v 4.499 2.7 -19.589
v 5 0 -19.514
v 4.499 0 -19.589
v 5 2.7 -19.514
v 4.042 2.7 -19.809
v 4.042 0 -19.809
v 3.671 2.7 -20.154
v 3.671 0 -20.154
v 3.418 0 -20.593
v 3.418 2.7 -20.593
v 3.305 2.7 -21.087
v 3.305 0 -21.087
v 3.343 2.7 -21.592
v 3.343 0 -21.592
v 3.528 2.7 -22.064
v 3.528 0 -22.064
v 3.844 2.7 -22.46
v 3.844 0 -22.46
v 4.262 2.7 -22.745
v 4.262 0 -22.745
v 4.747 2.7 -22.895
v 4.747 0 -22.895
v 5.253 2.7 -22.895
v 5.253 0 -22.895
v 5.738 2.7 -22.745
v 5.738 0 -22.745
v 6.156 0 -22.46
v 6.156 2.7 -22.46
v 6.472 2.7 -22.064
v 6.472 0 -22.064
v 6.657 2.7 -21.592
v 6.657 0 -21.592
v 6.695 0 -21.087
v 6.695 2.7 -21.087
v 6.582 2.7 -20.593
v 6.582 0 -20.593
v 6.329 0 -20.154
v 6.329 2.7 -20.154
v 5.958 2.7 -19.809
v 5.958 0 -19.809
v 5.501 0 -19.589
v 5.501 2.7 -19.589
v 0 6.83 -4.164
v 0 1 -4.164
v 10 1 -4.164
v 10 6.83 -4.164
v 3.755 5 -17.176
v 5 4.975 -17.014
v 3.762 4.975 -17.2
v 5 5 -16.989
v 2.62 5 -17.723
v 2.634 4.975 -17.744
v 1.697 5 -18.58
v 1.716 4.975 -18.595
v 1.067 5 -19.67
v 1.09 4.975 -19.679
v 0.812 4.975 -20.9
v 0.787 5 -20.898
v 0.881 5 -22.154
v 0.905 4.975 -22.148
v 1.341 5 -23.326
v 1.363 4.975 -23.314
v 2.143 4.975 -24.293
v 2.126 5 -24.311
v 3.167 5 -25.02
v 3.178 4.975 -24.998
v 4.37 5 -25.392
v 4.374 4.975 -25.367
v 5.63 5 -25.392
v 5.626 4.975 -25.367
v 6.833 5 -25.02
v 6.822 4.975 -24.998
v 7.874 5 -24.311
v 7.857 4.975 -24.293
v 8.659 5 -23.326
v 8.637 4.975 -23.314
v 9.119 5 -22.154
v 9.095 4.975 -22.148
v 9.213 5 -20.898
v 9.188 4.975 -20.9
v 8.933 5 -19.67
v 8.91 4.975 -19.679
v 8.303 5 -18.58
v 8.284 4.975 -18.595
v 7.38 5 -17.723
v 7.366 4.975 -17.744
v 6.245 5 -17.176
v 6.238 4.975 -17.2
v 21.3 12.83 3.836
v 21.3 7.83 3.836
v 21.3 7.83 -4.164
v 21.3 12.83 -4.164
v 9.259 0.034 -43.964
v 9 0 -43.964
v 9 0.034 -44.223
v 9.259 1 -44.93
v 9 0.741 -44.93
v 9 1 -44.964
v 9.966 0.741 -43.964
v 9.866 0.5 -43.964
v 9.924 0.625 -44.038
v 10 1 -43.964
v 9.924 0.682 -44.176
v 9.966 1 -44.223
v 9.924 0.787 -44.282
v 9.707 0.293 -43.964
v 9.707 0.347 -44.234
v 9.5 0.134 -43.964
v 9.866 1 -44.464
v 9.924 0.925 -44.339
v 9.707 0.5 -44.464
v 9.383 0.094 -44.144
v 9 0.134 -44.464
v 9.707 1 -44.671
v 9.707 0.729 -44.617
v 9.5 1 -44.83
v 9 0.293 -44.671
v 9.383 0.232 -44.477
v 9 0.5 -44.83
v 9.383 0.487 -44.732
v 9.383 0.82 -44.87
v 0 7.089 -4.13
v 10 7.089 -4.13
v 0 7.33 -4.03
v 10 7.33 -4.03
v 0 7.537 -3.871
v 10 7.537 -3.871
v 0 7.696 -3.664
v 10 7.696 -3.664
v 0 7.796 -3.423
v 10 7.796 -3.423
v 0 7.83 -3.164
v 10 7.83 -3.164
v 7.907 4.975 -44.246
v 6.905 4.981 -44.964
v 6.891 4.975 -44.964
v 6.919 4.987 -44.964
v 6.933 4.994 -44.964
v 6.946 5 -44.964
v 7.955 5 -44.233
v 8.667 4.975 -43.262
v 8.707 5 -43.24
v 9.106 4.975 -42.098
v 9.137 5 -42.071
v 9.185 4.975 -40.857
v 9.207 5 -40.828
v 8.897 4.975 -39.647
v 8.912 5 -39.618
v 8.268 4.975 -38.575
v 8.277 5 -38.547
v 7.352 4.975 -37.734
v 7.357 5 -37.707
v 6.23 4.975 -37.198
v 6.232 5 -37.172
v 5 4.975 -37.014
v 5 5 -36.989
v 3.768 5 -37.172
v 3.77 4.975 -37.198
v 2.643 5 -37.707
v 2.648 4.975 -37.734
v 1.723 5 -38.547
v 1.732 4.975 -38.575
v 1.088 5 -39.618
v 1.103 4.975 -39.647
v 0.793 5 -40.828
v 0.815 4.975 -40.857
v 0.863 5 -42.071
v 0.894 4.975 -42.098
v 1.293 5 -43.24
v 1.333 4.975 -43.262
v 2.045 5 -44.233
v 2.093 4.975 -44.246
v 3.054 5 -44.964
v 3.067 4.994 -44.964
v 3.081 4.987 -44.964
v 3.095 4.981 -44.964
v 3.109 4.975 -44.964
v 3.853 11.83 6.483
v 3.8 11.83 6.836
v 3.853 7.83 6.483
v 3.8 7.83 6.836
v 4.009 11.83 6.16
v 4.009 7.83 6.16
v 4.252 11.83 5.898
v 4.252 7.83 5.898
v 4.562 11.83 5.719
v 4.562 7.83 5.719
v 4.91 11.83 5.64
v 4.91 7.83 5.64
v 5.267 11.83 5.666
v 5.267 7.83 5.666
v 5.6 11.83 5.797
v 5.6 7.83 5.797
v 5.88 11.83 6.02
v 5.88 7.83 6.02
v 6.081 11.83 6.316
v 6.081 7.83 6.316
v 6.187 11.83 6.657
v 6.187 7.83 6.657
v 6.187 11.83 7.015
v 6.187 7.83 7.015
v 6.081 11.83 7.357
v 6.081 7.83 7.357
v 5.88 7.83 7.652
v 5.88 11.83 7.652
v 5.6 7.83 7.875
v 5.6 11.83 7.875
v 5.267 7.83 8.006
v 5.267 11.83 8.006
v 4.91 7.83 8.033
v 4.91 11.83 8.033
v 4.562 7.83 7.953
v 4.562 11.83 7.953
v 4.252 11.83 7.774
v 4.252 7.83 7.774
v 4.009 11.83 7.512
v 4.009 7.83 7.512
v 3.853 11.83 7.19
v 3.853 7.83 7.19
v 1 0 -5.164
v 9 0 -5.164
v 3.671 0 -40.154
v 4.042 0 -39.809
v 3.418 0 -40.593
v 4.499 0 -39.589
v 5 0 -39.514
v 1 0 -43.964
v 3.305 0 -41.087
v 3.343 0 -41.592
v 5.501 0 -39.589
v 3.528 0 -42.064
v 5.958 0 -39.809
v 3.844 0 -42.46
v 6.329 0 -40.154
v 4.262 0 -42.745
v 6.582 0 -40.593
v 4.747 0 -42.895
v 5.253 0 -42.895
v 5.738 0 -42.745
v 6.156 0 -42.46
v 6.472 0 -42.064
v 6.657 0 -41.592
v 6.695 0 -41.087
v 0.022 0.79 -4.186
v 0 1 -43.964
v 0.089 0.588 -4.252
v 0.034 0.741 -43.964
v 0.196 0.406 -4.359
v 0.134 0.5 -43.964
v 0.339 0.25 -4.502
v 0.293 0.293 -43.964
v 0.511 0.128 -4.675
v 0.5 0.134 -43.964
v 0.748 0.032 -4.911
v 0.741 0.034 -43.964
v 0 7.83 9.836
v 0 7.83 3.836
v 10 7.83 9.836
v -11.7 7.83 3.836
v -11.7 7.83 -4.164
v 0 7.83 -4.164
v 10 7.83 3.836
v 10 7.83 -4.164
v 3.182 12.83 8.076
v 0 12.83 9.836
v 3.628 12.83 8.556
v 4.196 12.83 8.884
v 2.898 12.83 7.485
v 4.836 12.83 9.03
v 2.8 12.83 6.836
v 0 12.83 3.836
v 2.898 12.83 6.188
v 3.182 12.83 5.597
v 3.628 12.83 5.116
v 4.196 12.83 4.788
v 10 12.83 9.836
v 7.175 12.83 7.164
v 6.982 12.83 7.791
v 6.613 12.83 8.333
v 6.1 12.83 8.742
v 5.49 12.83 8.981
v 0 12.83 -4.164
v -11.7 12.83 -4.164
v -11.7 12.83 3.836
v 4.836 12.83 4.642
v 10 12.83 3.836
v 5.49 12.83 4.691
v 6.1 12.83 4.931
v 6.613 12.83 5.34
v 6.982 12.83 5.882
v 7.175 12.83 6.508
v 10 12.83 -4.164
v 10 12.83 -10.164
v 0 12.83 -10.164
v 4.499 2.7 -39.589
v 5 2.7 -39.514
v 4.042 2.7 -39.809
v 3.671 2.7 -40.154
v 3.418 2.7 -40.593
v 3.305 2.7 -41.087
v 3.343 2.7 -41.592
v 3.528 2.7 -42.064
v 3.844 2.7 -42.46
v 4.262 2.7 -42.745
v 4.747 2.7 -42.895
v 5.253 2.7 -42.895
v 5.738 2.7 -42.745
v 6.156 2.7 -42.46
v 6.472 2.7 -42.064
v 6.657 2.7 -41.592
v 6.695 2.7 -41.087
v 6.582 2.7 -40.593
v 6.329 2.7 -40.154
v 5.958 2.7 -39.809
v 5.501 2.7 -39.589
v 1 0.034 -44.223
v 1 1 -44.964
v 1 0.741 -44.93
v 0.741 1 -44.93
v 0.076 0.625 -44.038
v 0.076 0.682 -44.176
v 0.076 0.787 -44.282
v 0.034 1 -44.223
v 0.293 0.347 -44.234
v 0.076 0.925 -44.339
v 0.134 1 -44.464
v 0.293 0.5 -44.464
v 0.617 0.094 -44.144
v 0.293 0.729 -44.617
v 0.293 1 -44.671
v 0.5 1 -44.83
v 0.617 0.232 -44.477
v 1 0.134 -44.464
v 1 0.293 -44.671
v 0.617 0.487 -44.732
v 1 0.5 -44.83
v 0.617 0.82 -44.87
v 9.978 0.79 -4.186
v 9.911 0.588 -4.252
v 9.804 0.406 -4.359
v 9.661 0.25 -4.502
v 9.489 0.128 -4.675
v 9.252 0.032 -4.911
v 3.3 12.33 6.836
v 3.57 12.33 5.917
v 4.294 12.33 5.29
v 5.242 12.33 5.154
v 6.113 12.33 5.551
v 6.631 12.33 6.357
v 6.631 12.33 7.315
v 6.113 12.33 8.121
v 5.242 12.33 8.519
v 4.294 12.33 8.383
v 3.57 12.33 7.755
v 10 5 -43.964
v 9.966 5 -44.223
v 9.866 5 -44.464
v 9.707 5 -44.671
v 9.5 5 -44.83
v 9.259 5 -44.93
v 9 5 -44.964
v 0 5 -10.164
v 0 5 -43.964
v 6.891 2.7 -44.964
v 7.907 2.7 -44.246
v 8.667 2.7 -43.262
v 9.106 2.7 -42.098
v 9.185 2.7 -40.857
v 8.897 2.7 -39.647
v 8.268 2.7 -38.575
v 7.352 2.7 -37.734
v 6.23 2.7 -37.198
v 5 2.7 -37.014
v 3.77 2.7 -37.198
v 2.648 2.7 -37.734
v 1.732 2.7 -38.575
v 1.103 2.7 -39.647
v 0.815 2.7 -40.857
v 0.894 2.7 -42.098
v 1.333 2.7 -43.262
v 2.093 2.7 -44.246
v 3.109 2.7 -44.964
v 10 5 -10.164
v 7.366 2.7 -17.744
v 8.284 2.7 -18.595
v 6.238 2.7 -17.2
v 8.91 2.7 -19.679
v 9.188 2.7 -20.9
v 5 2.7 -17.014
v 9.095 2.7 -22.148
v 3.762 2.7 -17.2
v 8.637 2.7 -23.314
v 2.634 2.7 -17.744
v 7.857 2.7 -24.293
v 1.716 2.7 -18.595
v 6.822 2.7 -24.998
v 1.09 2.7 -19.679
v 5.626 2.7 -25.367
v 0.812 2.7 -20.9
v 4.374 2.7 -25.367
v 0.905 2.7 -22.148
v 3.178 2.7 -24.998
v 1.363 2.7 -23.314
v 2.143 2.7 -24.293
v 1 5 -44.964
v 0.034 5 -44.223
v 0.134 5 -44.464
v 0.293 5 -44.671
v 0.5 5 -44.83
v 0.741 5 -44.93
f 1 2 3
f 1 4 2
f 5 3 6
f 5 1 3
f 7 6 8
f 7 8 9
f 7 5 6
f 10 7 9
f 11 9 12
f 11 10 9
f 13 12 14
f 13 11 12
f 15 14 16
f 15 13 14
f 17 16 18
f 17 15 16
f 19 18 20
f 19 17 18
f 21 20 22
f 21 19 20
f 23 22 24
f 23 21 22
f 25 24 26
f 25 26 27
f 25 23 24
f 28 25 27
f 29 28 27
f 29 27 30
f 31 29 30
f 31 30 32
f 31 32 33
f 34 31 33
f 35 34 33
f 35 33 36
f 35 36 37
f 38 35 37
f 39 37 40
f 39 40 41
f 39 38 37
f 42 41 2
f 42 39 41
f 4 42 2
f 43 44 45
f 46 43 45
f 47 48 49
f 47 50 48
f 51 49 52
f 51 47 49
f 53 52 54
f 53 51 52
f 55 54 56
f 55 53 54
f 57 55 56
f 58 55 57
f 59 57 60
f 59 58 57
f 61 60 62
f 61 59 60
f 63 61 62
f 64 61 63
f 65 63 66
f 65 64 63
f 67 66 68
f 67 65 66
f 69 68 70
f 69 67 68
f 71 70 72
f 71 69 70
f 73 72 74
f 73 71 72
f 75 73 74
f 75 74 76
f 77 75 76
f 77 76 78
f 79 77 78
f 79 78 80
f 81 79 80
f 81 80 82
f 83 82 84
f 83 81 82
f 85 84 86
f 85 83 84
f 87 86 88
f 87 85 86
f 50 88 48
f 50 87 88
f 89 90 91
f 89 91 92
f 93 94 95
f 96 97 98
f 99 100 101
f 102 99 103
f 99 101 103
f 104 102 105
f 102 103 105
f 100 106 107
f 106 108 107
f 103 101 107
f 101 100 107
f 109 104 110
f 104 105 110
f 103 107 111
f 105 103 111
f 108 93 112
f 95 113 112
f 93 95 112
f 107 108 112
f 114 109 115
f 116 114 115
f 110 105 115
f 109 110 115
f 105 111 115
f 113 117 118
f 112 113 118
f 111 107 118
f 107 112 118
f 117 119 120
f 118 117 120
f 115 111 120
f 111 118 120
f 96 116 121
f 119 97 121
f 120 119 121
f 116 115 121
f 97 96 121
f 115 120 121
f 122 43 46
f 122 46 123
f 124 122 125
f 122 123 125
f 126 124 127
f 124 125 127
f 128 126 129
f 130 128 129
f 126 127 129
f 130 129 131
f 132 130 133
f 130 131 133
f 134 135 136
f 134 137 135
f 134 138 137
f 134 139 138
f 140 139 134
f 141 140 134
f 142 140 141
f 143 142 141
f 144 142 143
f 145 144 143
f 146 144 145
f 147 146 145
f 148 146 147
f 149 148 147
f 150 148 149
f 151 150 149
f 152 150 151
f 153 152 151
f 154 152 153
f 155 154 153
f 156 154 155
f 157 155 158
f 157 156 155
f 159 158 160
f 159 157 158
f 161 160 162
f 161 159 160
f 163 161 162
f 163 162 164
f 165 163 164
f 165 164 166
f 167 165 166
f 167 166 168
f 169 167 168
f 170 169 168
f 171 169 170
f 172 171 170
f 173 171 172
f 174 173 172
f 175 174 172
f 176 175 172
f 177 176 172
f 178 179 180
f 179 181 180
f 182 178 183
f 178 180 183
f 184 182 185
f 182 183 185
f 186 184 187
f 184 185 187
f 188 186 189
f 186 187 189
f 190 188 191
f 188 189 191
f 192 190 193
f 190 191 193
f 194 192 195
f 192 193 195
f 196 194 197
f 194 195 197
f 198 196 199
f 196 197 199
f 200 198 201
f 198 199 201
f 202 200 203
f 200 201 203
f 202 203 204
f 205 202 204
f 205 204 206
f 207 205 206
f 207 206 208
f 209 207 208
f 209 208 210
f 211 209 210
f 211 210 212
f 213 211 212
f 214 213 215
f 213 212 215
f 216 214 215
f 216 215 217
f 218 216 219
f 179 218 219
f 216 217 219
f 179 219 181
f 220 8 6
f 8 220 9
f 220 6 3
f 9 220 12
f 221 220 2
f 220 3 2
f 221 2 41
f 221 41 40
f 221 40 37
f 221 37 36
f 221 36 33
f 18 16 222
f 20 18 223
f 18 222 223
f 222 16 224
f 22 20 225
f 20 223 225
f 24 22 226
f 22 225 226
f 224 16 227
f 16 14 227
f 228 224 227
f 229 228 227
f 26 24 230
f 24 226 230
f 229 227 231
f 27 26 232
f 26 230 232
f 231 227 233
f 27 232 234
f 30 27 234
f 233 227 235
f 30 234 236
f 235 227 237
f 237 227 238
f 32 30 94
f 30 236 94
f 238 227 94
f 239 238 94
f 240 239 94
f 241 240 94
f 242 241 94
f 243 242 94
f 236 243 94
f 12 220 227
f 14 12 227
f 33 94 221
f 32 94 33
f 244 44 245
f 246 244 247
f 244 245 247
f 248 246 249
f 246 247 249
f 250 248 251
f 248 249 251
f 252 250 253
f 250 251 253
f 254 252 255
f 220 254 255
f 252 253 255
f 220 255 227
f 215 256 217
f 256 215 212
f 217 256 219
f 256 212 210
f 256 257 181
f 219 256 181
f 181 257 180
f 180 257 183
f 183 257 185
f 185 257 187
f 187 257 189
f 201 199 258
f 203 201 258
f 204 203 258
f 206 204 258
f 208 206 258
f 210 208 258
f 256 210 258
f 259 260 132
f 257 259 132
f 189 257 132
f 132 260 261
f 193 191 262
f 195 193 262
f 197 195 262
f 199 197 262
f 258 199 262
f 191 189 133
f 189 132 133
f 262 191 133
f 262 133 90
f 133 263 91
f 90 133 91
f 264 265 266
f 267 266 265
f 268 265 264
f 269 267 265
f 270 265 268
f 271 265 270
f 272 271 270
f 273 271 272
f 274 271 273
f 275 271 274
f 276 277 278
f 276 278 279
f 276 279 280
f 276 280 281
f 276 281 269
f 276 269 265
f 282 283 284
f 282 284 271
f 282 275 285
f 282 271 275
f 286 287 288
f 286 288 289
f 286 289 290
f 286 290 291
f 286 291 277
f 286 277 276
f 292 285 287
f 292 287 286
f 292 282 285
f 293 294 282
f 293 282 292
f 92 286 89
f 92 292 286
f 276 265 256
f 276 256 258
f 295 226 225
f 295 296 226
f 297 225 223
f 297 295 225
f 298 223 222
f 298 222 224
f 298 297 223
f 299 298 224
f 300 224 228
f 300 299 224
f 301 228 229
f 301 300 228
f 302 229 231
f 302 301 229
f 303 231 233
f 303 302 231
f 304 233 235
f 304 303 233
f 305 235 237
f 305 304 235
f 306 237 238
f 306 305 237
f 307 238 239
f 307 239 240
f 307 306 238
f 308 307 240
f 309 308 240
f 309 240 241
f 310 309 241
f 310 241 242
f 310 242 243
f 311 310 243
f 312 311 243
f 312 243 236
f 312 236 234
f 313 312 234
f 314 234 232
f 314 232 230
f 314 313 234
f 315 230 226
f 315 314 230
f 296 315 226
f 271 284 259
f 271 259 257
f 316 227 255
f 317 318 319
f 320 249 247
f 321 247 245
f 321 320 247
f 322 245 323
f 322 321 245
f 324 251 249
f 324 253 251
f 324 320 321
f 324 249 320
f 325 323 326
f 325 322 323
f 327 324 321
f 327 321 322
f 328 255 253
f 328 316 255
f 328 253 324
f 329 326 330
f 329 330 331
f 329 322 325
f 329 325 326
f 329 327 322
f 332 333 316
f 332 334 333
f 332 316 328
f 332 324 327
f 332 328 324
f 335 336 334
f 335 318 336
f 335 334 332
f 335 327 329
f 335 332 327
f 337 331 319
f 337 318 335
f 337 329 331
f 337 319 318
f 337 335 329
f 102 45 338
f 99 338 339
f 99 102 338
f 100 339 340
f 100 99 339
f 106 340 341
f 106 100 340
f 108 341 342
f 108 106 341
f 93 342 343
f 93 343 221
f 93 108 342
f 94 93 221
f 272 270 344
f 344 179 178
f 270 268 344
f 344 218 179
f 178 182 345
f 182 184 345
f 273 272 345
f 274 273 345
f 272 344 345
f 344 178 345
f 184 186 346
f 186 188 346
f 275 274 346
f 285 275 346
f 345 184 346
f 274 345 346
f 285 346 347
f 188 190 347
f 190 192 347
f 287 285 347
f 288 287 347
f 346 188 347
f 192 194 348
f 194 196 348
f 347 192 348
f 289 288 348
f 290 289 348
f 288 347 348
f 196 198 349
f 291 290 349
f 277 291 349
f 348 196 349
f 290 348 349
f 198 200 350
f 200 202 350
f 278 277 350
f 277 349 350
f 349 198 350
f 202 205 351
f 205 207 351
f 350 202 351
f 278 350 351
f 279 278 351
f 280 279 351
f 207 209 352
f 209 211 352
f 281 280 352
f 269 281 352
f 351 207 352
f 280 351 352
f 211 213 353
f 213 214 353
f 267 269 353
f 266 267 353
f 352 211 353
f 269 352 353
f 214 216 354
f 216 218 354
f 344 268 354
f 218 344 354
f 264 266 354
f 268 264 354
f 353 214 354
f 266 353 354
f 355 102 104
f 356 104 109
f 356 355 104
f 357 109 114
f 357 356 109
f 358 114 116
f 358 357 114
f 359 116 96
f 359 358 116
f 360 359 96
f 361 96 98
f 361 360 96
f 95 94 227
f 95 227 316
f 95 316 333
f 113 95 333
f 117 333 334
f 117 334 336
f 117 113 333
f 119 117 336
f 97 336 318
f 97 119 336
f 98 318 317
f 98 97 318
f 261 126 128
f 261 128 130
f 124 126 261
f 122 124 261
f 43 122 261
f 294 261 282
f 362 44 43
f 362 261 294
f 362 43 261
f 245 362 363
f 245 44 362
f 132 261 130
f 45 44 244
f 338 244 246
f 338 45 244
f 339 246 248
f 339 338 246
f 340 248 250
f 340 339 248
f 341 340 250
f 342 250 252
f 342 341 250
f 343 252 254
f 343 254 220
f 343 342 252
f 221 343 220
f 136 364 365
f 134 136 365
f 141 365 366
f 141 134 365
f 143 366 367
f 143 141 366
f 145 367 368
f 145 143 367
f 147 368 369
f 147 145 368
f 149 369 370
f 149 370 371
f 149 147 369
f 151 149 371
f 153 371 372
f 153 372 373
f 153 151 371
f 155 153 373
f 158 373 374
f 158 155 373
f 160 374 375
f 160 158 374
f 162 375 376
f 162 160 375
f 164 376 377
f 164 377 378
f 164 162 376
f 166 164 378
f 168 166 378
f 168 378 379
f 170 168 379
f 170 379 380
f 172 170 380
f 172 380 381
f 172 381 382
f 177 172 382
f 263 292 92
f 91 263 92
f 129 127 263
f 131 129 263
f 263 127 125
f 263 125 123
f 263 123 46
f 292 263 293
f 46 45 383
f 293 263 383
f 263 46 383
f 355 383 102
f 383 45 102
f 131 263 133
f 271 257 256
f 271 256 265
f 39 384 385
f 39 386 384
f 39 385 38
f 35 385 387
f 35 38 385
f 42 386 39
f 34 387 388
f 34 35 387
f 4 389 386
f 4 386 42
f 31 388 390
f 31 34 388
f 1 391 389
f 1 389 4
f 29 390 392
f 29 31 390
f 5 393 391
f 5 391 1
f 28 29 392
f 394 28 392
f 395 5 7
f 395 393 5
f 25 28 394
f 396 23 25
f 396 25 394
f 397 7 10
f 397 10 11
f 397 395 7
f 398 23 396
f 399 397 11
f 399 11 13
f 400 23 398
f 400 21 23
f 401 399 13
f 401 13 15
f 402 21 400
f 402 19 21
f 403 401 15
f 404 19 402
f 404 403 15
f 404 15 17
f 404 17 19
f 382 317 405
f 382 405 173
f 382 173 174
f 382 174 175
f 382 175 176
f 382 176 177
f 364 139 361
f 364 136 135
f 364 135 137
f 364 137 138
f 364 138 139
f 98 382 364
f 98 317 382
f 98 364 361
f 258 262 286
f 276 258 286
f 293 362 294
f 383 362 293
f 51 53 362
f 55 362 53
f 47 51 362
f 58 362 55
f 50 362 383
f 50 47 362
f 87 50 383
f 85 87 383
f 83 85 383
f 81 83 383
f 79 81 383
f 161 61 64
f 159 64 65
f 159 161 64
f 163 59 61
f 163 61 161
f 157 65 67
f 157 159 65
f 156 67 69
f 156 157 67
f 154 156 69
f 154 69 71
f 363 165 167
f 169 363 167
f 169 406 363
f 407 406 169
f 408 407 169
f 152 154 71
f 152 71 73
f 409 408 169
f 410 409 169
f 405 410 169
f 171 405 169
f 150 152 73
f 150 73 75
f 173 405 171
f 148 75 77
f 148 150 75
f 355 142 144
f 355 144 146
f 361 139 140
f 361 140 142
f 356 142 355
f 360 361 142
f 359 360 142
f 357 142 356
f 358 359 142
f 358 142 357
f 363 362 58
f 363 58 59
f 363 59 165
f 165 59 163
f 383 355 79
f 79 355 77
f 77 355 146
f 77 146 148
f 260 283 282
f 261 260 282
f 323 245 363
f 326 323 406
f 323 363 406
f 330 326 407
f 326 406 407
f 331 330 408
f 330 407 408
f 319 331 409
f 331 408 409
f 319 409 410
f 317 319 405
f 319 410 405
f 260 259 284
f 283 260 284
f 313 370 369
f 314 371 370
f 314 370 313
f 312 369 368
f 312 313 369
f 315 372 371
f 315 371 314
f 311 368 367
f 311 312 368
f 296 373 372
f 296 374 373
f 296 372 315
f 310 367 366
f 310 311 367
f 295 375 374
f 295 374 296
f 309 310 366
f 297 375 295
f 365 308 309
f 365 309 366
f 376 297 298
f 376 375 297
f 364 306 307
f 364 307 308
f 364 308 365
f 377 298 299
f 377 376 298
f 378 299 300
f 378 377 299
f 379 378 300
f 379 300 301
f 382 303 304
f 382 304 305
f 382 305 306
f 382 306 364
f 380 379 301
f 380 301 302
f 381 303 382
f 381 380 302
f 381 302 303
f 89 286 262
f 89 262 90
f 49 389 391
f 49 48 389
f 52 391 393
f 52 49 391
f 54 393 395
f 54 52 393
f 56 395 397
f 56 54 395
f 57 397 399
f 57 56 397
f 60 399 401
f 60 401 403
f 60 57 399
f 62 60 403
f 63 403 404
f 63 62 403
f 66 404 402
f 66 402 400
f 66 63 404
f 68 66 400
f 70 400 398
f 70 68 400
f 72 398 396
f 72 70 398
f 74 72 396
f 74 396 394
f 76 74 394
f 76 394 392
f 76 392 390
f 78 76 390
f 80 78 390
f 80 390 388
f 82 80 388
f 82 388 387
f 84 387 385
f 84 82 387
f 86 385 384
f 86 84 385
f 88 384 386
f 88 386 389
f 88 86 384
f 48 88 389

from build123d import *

# Parameters (mm, degrees)
SKETCH1_W                                       = 10
SKETCH1_H                                       = 40.8
BOSS_EXTRUDE1_DEPTH                             = 5
SKETCH7_W                                       = 10
SKETCH7_H                                       = 6
BOSS_EXTRUDE2_DEPTH                             = 7.83
SKETCH8_W                                       = 33
SKETCH8_H                                       = 5
BOSS_EXTRUDE3_DEPTH                             = 8
SKETCH9_W                                       = 10
SKETCH9_H                                       = 5
BOSS_EXTRUDE4_DEPTH                             = 6
CSK_FOR_M2_FLAT_HEAD_MACHINE_SCREW1_D           = 2.4
CSK_FOR_M2_FLAT_HEAD_MACHINE_SCREW1_CSINK_D     = 4.4
CSK_FOR_M2_FLAT_HEAD_MACHINE_SCREW1_CSINK_ANGLE = 90
CBORE_FOR_M3_HEX_HEAD_MACHINE_SCREW1_AT_COUNT   = 2
CBORE_FOR_M3_HEX_HEAD_MACHINE_SCREW1_AT_PITCH   = 20
FILLET1_R                                       = 1


with BuildPart() as part:
    # Sketch1 → Boss-Extrude1 (new body)
    with BuildSketch(Plane(origin=(0, 0, 0), x_dir=(1, 0, 0), z_dir=(0, 1, 0))):
        with Locations((5, 24.563754531)):
            Rectangle(SKETCH1_W, SKETCH1_H)
    extrude(amount=BOSS_EXTRUDE1_DEPTH)

    # Sketch7 → Boss-Extrude2 (add)
    with BuildSketch(Plane(origin=(0, 5, 0), x_dir=(1, 0, 0), z_dir=(0, 1, 0))):
        with Locations((5, 7.163754531)):
            Rectangle(SKETCH7_W, SKETCH7_H)
    extrude(amount=BOSS_EXTRUDE2_DEPTH)

    # Sketch8 → Boss-Extrude3 (add)
    with BuildSketch(Plane.XY.offset(-4.163754531)):
        with Locations((4.8, 10.33)):
            Rectangle(SKETCH8_W, SKETCH8_H)
    extrude(amount=BOSS_EXTRUDE3_DEPTH)

    # Sketch9 → Boss-Extrude4 (add)
    with BuildSketch(Plane.XY.offset(3.836245469)):
        with Locations((5, 10.33)):
            Rectangle(SKETCH9_W, SKETCH9_H)
    extrude(amount=BOSS_EXTRUDE4_DEPTH)

    # CSK for M2 Flat Head Machine Screw1 (through all)
    with Locations(Plane(origin=(0, 12.83, 0), x_dir=(1, 0, 0), z_dir=(0, 1, 0))):
        with Locations((5, -6.836245469)):
            CounterSinkHole(CSK_FOR_M2_FLAT_HEAD_MACHINE_SCREW1_D / 2, CSK_FOR_M2_FLAT_HEAD_MACHINE_SCREW1_CSINK_D / 2, counter_sink_angle=CSK_FOR_M2_FLAT_HEAD_MACHINE_SCREW1_CSINK_ANGLE)

    # Sketch13 → CBORE for M3 Hex Head Machine Screw1 (revolve, cut)
    with BuildSketch(Plane(origin=(5, 5, -21.213754531), x_dir=(0, 0, 1), z_dir=(1, 0, 0))):
        Polygon((0, 0), (0, 5), (1.7, 5), (1.7, 2.3), (4.2, 2.3), (4.2, 0.025), (4.225, 0), align=None)
    cbore_for_m3_hex_head_machine_screw1 = revolve(axis=Axis((5, 11.35, -21.213754531), (0, -1, 0)), mode=Mode.SUBTRACT)

    # CBORE for M3 Hex Head Machine Screw1 at: CBORE for M3 Hex Head Machine Screw1 ×2
    with Locations(*[(0, 0, -i * CBORE_FOR_M3_HEX_HEAD_MACHINE_SCREW1_AT_PITCH) for i in range(1, CBORE_FOR_M3_HEX_HEAD_MACHINE_SCREW1_AT_COUNT)]):
        add(cbore_for_m3_hex_head_machine_screw1, mode=Mode.SUBTRACT)

    # Fillet1
    fillet1_edges = [part.edges().sort_by_distance(p)[0] for p in [
        (5, 7.83, -4.163754531),
        (5, 0, -44.963754531),
        (10, 0, -24.563754531),
        (5, 0, -4.163754531),
        (0, 0, -24.563754531),
        (0, 2.5, -44.963754531),
        (10, 2.5, -44.963754531),
    ]]
    fillet(fillet1_edges, radius=FILLET1_R)


solid = part.part
